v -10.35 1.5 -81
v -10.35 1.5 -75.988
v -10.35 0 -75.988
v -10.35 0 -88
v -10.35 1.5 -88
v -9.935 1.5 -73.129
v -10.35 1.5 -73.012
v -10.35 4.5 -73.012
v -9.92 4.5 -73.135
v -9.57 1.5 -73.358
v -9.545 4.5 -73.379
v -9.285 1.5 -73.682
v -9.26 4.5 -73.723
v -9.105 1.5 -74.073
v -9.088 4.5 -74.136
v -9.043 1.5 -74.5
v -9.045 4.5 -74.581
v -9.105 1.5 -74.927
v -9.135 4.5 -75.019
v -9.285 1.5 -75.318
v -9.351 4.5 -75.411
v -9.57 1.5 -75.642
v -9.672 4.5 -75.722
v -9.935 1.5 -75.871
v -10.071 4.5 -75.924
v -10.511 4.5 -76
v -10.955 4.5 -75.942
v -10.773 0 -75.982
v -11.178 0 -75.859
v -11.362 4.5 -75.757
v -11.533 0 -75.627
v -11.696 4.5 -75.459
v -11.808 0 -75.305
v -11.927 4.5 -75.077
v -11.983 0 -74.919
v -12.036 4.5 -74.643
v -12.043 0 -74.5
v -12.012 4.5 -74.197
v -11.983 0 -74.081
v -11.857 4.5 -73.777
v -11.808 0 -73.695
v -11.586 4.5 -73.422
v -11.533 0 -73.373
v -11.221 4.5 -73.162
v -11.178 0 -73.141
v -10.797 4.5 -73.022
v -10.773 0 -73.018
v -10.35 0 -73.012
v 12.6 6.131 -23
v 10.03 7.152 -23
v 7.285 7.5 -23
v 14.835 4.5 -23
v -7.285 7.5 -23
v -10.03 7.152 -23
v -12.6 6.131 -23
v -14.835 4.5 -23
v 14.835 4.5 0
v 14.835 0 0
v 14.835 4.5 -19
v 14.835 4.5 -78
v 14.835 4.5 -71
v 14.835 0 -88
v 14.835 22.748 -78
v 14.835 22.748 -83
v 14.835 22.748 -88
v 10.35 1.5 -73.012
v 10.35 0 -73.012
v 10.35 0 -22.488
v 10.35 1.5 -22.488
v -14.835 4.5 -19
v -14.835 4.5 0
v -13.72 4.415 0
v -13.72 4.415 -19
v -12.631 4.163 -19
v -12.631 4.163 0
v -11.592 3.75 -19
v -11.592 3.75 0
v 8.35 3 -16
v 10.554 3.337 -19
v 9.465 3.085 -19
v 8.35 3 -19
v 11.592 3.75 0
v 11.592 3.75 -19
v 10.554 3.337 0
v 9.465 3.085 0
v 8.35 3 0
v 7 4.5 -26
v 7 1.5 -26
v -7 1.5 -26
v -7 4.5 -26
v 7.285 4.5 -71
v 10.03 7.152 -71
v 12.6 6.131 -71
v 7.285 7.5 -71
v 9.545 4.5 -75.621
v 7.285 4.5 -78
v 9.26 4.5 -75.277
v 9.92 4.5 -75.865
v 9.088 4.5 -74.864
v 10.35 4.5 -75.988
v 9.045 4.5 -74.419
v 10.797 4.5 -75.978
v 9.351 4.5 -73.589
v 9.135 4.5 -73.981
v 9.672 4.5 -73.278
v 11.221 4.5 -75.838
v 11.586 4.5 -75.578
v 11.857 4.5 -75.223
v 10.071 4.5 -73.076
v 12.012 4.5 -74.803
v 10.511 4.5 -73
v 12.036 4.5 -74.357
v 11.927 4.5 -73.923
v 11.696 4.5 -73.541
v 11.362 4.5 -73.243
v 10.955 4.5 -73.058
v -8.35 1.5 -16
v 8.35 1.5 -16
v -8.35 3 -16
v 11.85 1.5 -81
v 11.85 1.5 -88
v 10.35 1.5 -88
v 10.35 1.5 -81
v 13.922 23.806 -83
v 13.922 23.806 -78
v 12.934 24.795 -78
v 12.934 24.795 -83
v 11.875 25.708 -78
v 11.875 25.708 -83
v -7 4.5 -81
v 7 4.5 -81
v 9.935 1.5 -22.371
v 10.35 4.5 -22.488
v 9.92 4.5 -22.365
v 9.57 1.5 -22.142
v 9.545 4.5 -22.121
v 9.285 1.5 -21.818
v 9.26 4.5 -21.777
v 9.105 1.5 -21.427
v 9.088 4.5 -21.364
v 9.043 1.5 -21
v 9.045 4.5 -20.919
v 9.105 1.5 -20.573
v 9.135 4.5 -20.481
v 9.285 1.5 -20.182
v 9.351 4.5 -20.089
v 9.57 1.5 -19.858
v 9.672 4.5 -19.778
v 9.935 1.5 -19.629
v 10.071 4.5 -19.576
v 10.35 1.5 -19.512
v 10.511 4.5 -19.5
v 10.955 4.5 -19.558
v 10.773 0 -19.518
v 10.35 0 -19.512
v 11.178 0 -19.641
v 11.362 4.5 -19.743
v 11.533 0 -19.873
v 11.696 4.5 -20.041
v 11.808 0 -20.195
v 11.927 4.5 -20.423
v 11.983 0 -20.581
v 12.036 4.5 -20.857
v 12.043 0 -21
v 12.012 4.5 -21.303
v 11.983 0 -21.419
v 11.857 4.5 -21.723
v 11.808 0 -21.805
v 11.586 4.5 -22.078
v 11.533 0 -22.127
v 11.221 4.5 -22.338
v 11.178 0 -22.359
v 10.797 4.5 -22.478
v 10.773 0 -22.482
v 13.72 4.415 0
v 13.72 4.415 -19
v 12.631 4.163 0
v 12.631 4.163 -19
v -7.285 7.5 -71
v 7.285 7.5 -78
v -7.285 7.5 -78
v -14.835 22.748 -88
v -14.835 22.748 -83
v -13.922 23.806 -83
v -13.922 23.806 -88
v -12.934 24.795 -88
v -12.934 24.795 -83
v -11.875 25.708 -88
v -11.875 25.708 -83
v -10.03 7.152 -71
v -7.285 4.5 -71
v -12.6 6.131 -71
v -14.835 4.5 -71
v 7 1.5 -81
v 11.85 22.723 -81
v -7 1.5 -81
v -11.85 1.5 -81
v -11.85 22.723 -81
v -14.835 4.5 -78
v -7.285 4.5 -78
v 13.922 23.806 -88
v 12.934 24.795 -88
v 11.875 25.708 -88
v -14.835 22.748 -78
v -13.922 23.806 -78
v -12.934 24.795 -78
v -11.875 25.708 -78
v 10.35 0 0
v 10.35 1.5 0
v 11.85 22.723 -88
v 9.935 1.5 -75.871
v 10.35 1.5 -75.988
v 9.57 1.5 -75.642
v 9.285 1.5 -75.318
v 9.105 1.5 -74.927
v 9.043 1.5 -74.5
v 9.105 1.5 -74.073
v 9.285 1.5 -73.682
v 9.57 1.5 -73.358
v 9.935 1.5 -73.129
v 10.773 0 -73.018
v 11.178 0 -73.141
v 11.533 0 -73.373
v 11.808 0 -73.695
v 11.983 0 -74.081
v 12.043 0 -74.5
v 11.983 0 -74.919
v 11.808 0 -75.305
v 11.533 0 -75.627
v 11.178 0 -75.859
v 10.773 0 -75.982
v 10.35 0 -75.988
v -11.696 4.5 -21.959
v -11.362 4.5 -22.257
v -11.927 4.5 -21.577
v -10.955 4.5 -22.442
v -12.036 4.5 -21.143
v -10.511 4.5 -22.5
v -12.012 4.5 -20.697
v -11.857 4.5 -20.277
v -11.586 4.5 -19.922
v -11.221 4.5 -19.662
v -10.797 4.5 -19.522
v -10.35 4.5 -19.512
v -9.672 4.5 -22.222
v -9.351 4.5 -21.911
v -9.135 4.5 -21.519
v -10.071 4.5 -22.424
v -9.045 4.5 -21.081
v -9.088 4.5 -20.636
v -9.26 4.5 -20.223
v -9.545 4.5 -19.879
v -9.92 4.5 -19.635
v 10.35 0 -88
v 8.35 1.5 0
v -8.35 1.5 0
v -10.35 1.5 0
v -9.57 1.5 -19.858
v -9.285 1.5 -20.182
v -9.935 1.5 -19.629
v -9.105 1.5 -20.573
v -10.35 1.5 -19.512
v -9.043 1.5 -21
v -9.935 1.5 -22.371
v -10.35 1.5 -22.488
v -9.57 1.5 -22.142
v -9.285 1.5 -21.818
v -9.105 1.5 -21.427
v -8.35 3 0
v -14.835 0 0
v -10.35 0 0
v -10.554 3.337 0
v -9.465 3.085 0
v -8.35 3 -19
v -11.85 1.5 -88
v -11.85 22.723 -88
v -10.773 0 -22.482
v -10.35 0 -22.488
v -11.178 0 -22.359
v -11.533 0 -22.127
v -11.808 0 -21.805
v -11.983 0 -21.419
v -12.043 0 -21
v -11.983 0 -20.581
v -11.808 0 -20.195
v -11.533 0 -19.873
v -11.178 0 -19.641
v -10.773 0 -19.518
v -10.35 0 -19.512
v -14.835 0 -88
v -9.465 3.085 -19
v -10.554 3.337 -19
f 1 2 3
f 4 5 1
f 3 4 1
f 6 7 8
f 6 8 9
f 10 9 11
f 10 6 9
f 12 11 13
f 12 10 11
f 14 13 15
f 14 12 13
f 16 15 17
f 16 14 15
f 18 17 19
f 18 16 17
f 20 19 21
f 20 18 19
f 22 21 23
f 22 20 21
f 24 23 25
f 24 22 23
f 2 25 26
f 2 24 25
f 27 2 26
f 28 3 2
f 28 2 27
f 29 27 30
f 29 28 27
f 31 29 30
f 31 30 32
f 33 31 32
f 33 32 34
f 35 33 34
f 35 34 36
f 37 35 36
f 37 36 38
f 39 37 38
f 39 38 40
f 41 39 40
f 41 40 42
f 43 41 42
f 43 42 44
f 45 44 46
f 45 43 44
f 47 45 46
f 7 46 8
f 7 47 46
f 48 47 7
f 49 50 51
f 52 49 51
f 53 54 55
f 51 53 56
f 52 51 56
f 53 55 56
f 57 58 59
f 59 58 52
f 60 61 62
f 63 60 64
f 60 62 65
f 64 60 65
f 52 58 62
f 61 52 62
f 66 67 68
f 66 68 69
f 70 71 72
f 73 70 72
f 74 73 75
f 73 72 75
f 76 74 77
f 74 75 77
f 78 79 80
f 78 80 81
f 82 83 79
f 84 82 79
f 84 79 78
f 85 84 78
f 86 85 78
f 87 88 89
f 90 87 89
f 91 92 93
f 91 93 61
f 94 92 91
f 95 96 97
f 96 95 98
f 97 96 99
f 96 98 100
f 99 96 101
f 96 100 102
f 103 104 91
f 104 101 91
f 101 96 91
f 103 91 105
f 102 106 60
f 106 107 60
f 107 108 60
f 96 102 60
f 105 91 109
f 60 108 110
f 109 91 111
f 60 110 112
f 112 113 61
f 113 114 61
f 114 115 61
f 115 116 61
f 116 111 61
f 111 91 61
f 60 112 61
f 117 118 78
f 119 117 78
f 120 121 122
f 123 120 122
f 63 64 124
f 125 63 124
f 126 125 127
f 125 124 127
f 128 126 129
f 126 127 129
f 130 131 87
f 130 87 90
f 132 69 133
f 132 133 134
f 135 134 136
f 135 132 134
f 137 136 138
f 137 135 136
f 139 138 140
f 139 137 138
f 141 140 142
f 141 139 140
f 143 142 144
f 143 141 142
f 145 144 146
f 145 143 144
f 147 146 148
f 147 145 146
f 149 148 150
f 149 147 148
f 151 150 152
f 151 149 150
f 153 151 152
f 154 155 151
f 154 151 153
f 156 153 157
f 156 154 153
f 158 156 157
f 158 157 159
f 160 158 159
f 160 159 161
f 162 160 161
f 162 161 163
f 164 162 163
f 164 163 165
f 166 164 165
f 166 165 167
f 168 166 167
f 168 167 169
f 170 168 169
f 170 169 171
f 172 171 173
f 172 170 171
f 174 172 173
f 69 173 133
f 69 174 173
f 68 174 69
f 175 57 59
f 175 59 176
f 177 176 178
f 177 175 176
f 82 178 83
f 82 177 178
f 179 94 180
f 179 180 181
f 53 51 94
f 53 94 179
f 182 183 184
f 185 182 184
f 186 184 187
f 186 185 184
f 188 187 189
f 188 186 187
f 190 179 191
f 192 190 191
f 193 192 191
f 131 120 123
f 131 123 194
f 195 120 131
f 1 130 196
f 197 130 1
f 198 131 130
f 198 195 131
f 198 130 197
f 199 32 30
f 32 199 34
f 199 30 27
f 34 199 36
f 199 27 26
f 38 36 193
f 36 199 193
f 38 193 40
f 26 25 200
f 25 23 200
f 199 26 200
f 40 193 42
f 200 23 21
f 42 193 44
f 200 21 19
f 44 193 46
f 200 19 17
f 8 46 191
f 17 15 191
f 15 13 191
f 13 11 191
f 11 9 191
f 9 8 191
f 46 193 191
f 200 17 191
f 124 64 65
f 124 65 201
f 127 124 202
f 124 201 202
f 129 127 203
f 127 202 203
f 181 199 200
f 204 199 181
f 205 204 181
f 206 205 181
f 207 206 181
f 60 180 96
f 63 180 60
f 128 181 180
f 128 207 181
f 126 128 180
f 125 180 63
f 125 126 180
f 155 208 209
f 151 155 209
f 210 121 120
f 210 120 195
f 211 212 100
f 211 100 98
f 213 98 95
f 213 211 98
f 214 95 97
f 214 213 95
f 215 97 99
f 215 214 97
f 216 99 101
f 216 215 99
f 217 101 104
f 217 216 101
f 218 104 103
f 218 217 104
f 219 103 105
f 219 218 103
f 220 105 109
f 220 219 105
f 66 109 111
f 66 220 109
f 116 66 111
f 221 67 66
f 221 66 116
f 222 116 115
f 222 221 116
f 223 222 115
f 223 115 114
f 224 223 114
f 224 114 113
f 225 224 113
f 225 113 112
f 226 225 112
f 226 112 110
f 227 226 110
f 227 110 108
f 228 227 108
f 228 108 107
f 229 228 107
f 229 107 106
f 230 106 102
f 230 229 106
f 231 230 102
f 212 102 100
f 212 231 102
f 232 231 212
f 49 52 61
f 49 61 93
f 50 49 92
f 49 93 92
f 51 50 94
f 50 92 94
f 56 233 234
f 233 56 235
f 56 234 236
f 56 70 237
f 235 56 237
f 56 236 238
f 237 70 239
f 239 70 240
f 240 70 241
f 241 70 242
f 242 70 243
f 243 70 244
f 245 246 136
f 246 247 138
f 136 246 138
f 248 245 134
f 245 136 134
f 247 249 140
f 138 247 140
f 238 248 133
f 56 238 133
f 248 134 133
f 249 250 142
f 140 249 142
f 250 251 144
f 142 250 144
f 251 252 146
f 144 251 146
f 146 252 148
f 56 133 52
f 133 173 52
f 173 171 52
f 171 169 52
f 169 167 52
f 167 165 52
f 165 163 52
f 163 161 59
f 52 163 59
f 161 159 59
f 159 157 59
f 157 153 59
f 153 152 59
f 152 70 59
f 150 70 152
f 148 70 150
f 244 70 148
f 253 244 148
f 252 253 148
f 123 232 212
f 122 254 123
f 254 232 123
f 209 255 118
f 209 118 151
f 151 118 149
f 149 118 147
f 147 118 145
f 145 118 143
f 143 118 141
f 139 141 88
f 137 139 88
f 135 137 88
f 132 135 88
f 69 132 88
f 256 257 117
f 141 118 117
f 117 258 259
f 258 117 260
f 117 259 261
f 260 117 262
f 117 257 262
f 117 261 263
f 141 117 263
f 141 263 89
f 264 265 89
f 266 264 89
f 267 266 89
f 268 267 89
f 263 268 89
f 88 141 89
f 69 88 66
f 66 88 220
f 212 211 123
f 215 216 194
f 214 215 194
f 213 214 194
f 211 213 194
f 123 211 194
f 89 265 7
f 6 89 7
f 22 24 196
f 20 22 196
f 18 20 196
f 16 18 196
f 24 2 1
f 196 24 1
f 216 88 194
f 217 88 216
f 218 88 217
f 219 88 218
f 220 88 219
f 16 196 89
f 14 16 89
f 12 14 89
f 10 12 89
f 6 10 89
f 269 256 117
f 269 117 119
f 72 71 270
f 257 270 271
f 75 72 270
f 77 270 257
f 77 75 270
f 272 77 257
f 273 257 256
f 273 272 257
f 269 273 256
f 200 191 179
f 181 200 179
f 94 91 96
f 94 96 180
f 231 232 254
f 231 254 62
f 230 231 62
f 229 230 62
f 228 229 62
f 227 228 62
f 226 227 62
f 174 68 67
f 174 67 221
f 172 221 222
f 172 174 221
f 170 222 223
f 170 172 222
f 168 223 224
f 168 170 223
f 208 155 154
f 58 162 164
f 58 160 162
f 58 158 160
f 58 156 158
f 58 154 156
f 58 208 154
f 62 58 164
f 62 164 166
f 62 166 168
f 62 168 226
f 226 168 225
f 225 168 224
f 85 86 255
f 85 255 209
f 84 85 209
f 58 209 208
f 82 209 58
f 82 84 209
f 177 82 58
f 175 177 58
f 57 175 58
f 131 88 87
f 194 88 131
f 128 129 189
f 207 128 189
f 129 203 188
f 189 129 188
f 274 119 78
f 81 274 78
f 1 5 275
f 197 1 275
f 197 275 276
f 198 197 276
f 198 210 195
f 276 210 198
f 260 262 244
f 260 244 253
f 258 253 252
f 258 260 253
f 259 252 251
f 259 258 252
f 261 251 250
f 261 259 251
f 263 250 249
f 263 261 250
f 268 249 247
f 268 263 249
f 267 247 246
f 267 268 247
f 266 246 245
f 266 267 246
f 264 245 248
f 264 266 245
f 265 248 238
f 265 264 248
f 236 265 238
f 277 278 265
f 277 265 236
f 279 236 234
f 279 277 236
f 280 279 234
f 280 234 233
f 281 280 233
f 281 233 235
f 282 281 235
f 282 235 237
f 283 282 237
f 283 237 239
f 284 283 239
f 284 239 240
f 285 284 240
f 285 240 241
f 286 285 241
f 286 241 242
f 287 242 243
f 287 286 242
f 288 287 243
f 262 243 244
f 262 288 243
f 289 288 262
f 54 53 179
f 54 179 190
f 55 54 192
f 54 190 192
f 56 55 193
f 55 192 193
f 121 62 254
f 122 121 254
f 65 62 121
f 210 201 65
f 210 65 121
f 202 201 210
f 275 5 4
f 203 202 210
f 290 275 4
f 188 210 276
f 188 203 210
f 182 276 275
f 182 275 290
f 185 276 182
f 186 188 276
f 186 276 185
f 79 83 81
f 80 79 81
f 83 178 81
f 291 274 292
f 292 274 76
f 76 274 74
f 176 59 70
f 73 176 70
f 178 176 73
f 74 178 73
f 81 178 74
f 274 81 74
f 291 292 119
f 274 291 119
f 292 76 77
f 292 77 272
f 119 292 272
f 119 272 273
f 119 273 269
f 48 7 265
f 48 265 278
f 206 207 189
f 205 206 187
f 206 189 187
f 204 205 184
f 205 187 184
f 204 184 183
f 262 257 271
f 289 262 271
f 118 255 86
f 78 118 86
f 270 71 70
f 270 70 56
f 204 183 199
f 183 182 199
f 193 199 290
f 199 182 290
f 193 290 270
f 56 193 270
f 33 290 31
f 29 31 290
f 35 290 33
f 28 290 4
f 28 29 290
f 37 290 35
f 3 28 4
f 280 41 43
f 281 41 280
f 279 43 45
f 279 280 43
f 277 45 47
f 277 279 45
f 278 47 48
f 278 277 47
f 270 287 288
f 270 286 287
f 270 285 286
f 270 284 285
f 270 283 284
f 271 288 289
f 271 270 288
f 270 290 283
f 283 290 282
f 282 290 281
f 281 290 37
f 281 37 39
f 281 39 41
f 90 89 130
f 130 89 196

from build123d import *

# Parameters (mm, degrees)
SKETCH1_W               = 6.485
SKETCH1_H               = 4.5
BOSS_EXTRUDE1_DEPTH     = 88
BOSS_EXTRUDE1_2_DEPTH   = 88
SKETCH3_W               = 2
SKETCH3_H               = 1.5
CUT_EXTRUDE2_DEPTH      = 30
SKETCH4_W               = 2
SKETCH4_H               = 4.5
CUT_EXTRUDE3_DEPTH      = 65
BOSS_EXTRUDE2_REACH     = 93.644
SKETCH6_W               = 67
SKETCH6_H               = 3
BOSS_EXTRUDE3_DEPTH     = 5
CUT_EXTRUDE4_DEPTH      = 5
BOSS_EXTRUDE4_DEPTH     = 5
BOSS_EXTRUDE5_START     = 7
BOSS_EXTRUDE5_DEPTH     = 48
BOSS_EXTRUDE6_DEPTH     = 48
FILLET1_R               = 11
SKETCH18_W              = 14.57033113
SKETCH18_H              = 3
BOSS_EXTRUDE7_DEPTH     = 7
SKETCH15_W              = 23.7
SKETCH15_H              = 21.22267295
CUT_EXTRUDE6_DEPTH      = 7
SKETCH16_W              = 16.7
SKETCH16_H              = 1.5
CUT_EXTRUDE7_DEPTH      = 19
CUT_EXTRUDE5_DEPTH      = 92.727000479
CUT_EXTRUDE5_DEPTH_BACK = 92.727000479
SKETCH13_R              = 1.5
SKETCH17_W              = 14
SKETCH17_H              = 55
CUT_EXTRUDE8_DEPTH      = 3


with BuildPart() as part:
    # Sketch1 → Boss-Extrude1 (new body)
    with BuildSketch(Plane.XY):
        with Locations((-11.5925, 2.25)):
            Rectangle(SKETCH1_W, SKETCH1_H)
    extrude(amount=-BOSS_EXTRUDE1_DEPTH)


with BuildPart() as body_2:
    # Sketch1 → Boss-Extrude1 2 (new body)
    with BuildSketch(Plane.XY):
        with Locations((11.5925, 2.25)):
            Rectangle(SKETCH1_W, SKETCH1_H)
    extrude(amount=-BOSS_EXTRUDE1_2_DEPTH)


with BuildPart() as cut_extrude2_tool:
    # Sketch3 → Cut-Extrude2 (new body)
    with BuildSketch(Plane.XY):
        with Locations((-9.35, 0.75)):
            Rectangle(SKETCH3_W, SKETCH3_H)
        with Locations((9.35, 0.75)):
            Rectangle(SKETCH3_W, SKETCH3_H)
    extrude(amount=-CUT_EXTRUDE2_DEPTH)


with BuildPart() as part_1:
    add(part.part)

    # Cut-Extrude2: cut by cut_extrude2_tool
    add(cut_extrude2_tool.part, mode=Mode.SUBTRACT)


with BuildPart() as body_2_1:
    add(body_2.part)

    # Cut-Extrude2: cut by cut_extrude2_tool
    add(cut_extrude2_tool.part, mode=Mode.SUBTRACT)


with BuildPart() as cut_extrude3_tool:
    # Sketch4 → Cut-Extrude3 (new body)
    with BuildSketch(Plane(origin=(0, 0, -88), x_dir=(-1, 0, 0), z_dir=(0, 0, -1))):
        with Locations((9.35, 2.25)):
            Rectangle(SKETCH4_W, SKETCH4_H)
        with Locations((-9.35, 2.25)):
            Rectangle(SKETCH4_W, SKETCH4_H)
    extrude(amount=-CUT_EXTRUDE3_DEPTH)


with BuildPart() as part_2:
    add(part_1.part)

    # Cut-Extrude3: cut by cut_extrude3_tool
    add(cut_extrude3_tool.part, mode=Mode.SUBTRACT)


with BuildPart() as body_2_2:
    add(body_2_1.part)

    # Cut-Extrude3: cut by cut_extrude3_tool
    add(cut_extrude3_tool.part, mode=Mode.SUBTRACT)

    # Boss-Extrude2: up to this face of the body (flat: up to its plane)
    boss_extrude2_end = Plane(body_2_2.part.faces().sort_by_distance((10.35, 2.091743119, -50.857798165))[0])
    # Sketch6 → Boss-Extrude2 (add, up to the picked face)
    with BuildSketch(Plane(origin=(-10.35, 0, 0), x_dir=(0, 0, -1), z_dir=(1, 0, 0)), mode=Mode.PRIVATE) as boss_extrude2_sk1:
        with Locations((49.5, 3)):
            Rectangle(SKETCH6_W, SKETCH6_H)
    boss_extrude2_tool1 = split(extrude(boss_extrude2_sk1.sketch, amount=BOSS_EXTRUDE2_REACH, mode=Mode.PRIVATE), bisect_by=boss_extrude2_end, keep=Keep.BOTH, mode=Mode.PRIVATE)

    add(part_2.part)  # Boss-Extrude2 merges part
    add(boss_extrude2_tool1.solids().sort_by(Axis((-10.35, 3, -49.5), (1, 0, 0)))[0])

    # Sketch8 → Boss-Extrude3 (add)
    with BuildSketch(Plane(origin=(0, 0, -88), x_dir=(-1, 0, 0), z_dir=(0, 0, -1))):
        Polygon((-14.835, 25.70767295), (-14.835, 4.5), (-10.35, 4.5), (-10.35, 21.22267295), (10.35, 21.22267295), (10.35, 4.5), (14.835, 4.5), (14.835, 25.70767295), align=None)
    extrude(amount=-BOSS_EXTRUDE3_DEPTH)

    # Sketch9 → Cut-Extrude4 (cut)
    with BuildSketch(Plane(origin=(0, 0, -88), x_dir=(-1, 0, 0), z_dir=(0, 0, -1))):
        with BuildLine():
            Line((-15.009070225, 25.881743175), (-15.009070225, 22.527310239))
            ThreePointArc((-15.009070225, 22.527310239), (-13.436955933, 24.309628883), (-11.654637289, 25.881743175))
            Line((-11.654637289, 25.881743175), (-15.009070225, 25.881743175))
        make_face()
        with BuildLine():
            Line((15.009070225, 25.881743175), (15.009070225, 22.527310239))
            ThreePointArc((15.009070225, 22.527310239), (13.436955933, 24.309628883), (11.654637289, 25.881743175))
            Line((11.654637289, 25.881743175), (15.009070225, 25.881743175))
        make_face()
    extrude(amount=-CUT_EXTRUDE4_DEPTH, mode=Mode.SUBTRACT)

    # Sketch11 → Boss-Extrude4 (add)
    with BuildSketch(Plane.XY.offset(-83)):
        with BuildLine():
            Line((14.835, 4.5), (14.835, 22.748097759))
            ThreePointArc((14.835, 22.748097759), (13.436955933, 24.309628883), (11.875424809, 25.70767295))
            Line((11.875424809, 25.70767295), (-11.875424809, 25.70767295))
            ThreePointArc((-11.875424809, 25.70767295), (-13.436955933, 24.309628883), (-14.835, 22.748097759))
            Line((-14.835, 22.748097759), (-14.835, 4.5))
            Line((-14.835, 4.5), (14.835, 4.5))
        make_face()
    extrude(amount=BOSS_EXTRUDE4_DEPTH)

    # Sketch12 → Boss-Extrude5 (add)
    with BuildSketch(Plane.XY.offset(-78).offset(BOSS_EXTRUDE5_START)):
        Polygon((-14.835, 4.5), (-11.835, 7.5), (11.835, 7.5), (14.835, 4.5), align=None)
    extrude(amount=BOSS_EXTRUDE5_DEPTH)

    # Sketch14 → Boss-Extrude6 (add)
    with BuildSketch(Plane.XY.offset(-23)):
        Polygon((-11.835, 7.5), (-14.835, 4.5), (-10.835, 4.5), (-10.835, 7.5), align=None)
        Polygon((11.835, 7.5), (14.835, 4.5), (10.835, 4.5), (10.835, 7.5), align=None)
    extrude(amount=-BOSS_EXTRUDE6_DEPTH)

    # Fillet1
    # the kernel refuses this fillet: 11 mm, written as the material it takes off along each edge
    with BuildSketch(Plane(origin=(11.835, 7.5, -82.374586088), x_dir=(-1, 0, 0), z_dir=(0, 0, 1))) as fillet1_piece_1_section:
        with BuildLine():
            CenterArc((4.549834435, 11), FILLET1_R, 226.658241773, 43.341758227)
            Line((-3, 3), (0, 0))
            Line((0, 0), (4.549834435, 0))
        make_face()
    fillet1_piece_1 = extrude(amount=70.749172176, mode=Mode.PRIVATE)
    fillet1_piece_1 = split(fillet1_piece_1, bisect_by=Plane(origin=(11.355308805, 6.742969198, -78), z_dir=(0, 0, 1)), keep=Keep.TOP, mode=Mode.PRIVATE)
    add(fillet1_piece_1, mode=Mode.SUBTRACT)
    with BuildSketch(Plane(origin=(-11.835, 7.5, -82.374586088), x_dir=(1, 0, 0), z_dir=(0, 0, 1))) as fillet1_piece_2_section:
        with BuildLine():
            CenterArc((4.549834435, -11), FILLET1_R, 90, 43.341758227)
            Line((-3, -3), (0, 0))
            Line((0, 0), (4.549834435, 0))
        make_face()
    fillet1_piece_2 = extrude(amount=70.749172176, mode=Mode.PRIVATE)
    fillet1_piece_2 = split(fillet1_piece_2, bisect_by=Plane(origin=(-11.355308805, 6.742969198, -78), z_dir=(0, 0, 1)), keep=Keep.TOP, mode=Mode.PRIVATE)
    add(fillet1_piece_2, mode=Mode.SUBTRACT)

    # Sketch18 → Boss-Extrude7 (add)
    with BuildSketch(Plane(origin=(0, 0, -71), x_dir=(-1, 0, 0), z_dir=(0, 0, -1))):
        with Locations((0, 6)):
            Rectangle(SKETCH18_W, SKETCH18_H)
    extrude(amount=BOSS_EXTRUDE7_DEPTH)

    # Sketch15 → Cut-Extrude6 (cut)
    with BuildSketch(Plane(origin=(0, 0, -88), x_dir=(-1, 0, 0), z_dir=(0, 0, -1))):
        with Locations((0, 12.111336475)):
            Rectangle(SKETCH15_W, SKETCH15_H)
    extrude(amount=-CUT_EXTRUDE6_DEPTH, mode=Mode.SUBTRACT)

    # Sketch16 → Cut-Extrude7 (cut)
    with BuildSketch(Plane.XY):
        with BuildLine():
            ThreePointArc((11.5925, 3.75), (10.014054255, 3.189942939), (8.35, 3))
            Line((8.35, 3), (8.35, 4.5))
            Line((8.35, 4.5), (14.835, 4.5))
            ThreePointArc((14.835, 4.5), (13.170945745, 4.310057061), (11.5925, 3.75))
        make_face()
        with BuildLine():
            ThreePointArc((-11.5925, 3.75), (-10.014054255, 3.189942939), (-8.35, 3))
            Line((-8.35, 3), (-8.35, 4.5))
            Line((-8.35, 4.5), (-14.835, 4.5))
            ThreePointArc((-14.835, 4.5), (-13.170945745, 4.310057061), (-11.5925, 3.75))
        make_face()
        with Locations((0, 3.75)):
            Rectangle(SKETCH16_W, SKETCH16_H)
    extrude(amount=-CUT_EXTRUDE7_DEPTH, mode=Mode.SUBTRACT)

    # Sketch13 → Cut-Extrude5 (cut, two sides: drawn at the far end of the back side and taken through both)
    with BuildSketch(Plane(origin=(0, 4.5, 0), x_dir=(1, 0, 0), z_dir=(0, 1, 0)).offset(-CUT_EXTRUDE5_DEPTH_BACK)):
        with Locations(Location((10.542662348, 74.5, 0), (0, 0, 97.379545614))):
            Circle(SKETCH13_R)
        with Locations(Location((-10.542662348, 74.5, 0), (0, 0, 277.379545614))):
            Circle(SKETCH13_R)
        with Locations(Location((10.542662348, 21, 0), (0, 0, 97.379545614))):
            Circle(SKETCH13_R)
        with Locations(Location((-10.542662348, 21, 0), (0, 0, 277.379545614))):
            Circle(SKETCH13_R)
    extrude(amount=CUT_EXTRUDE5_DEPTH + CUT_EXTRUDE5_DEPTH_BACK, mode=Mode.SUBTRACT)

    # Sketch17 → Cut-Extrude8 (cut)
    with BuildSketch(Plane(origin=(0, 1.5, 0), x_dir=(-1, 0, 0), z_dir=(0, -1, 0))):
        with Locations((0, 53.5)):
            Rectangle(SKETCH17_W, SKETCH17_H)
    extrude(amount=-CUT_EXTRUDE8_DEPTH, mode=Mode.SUBTRACT)


solid = body_2_2.part
